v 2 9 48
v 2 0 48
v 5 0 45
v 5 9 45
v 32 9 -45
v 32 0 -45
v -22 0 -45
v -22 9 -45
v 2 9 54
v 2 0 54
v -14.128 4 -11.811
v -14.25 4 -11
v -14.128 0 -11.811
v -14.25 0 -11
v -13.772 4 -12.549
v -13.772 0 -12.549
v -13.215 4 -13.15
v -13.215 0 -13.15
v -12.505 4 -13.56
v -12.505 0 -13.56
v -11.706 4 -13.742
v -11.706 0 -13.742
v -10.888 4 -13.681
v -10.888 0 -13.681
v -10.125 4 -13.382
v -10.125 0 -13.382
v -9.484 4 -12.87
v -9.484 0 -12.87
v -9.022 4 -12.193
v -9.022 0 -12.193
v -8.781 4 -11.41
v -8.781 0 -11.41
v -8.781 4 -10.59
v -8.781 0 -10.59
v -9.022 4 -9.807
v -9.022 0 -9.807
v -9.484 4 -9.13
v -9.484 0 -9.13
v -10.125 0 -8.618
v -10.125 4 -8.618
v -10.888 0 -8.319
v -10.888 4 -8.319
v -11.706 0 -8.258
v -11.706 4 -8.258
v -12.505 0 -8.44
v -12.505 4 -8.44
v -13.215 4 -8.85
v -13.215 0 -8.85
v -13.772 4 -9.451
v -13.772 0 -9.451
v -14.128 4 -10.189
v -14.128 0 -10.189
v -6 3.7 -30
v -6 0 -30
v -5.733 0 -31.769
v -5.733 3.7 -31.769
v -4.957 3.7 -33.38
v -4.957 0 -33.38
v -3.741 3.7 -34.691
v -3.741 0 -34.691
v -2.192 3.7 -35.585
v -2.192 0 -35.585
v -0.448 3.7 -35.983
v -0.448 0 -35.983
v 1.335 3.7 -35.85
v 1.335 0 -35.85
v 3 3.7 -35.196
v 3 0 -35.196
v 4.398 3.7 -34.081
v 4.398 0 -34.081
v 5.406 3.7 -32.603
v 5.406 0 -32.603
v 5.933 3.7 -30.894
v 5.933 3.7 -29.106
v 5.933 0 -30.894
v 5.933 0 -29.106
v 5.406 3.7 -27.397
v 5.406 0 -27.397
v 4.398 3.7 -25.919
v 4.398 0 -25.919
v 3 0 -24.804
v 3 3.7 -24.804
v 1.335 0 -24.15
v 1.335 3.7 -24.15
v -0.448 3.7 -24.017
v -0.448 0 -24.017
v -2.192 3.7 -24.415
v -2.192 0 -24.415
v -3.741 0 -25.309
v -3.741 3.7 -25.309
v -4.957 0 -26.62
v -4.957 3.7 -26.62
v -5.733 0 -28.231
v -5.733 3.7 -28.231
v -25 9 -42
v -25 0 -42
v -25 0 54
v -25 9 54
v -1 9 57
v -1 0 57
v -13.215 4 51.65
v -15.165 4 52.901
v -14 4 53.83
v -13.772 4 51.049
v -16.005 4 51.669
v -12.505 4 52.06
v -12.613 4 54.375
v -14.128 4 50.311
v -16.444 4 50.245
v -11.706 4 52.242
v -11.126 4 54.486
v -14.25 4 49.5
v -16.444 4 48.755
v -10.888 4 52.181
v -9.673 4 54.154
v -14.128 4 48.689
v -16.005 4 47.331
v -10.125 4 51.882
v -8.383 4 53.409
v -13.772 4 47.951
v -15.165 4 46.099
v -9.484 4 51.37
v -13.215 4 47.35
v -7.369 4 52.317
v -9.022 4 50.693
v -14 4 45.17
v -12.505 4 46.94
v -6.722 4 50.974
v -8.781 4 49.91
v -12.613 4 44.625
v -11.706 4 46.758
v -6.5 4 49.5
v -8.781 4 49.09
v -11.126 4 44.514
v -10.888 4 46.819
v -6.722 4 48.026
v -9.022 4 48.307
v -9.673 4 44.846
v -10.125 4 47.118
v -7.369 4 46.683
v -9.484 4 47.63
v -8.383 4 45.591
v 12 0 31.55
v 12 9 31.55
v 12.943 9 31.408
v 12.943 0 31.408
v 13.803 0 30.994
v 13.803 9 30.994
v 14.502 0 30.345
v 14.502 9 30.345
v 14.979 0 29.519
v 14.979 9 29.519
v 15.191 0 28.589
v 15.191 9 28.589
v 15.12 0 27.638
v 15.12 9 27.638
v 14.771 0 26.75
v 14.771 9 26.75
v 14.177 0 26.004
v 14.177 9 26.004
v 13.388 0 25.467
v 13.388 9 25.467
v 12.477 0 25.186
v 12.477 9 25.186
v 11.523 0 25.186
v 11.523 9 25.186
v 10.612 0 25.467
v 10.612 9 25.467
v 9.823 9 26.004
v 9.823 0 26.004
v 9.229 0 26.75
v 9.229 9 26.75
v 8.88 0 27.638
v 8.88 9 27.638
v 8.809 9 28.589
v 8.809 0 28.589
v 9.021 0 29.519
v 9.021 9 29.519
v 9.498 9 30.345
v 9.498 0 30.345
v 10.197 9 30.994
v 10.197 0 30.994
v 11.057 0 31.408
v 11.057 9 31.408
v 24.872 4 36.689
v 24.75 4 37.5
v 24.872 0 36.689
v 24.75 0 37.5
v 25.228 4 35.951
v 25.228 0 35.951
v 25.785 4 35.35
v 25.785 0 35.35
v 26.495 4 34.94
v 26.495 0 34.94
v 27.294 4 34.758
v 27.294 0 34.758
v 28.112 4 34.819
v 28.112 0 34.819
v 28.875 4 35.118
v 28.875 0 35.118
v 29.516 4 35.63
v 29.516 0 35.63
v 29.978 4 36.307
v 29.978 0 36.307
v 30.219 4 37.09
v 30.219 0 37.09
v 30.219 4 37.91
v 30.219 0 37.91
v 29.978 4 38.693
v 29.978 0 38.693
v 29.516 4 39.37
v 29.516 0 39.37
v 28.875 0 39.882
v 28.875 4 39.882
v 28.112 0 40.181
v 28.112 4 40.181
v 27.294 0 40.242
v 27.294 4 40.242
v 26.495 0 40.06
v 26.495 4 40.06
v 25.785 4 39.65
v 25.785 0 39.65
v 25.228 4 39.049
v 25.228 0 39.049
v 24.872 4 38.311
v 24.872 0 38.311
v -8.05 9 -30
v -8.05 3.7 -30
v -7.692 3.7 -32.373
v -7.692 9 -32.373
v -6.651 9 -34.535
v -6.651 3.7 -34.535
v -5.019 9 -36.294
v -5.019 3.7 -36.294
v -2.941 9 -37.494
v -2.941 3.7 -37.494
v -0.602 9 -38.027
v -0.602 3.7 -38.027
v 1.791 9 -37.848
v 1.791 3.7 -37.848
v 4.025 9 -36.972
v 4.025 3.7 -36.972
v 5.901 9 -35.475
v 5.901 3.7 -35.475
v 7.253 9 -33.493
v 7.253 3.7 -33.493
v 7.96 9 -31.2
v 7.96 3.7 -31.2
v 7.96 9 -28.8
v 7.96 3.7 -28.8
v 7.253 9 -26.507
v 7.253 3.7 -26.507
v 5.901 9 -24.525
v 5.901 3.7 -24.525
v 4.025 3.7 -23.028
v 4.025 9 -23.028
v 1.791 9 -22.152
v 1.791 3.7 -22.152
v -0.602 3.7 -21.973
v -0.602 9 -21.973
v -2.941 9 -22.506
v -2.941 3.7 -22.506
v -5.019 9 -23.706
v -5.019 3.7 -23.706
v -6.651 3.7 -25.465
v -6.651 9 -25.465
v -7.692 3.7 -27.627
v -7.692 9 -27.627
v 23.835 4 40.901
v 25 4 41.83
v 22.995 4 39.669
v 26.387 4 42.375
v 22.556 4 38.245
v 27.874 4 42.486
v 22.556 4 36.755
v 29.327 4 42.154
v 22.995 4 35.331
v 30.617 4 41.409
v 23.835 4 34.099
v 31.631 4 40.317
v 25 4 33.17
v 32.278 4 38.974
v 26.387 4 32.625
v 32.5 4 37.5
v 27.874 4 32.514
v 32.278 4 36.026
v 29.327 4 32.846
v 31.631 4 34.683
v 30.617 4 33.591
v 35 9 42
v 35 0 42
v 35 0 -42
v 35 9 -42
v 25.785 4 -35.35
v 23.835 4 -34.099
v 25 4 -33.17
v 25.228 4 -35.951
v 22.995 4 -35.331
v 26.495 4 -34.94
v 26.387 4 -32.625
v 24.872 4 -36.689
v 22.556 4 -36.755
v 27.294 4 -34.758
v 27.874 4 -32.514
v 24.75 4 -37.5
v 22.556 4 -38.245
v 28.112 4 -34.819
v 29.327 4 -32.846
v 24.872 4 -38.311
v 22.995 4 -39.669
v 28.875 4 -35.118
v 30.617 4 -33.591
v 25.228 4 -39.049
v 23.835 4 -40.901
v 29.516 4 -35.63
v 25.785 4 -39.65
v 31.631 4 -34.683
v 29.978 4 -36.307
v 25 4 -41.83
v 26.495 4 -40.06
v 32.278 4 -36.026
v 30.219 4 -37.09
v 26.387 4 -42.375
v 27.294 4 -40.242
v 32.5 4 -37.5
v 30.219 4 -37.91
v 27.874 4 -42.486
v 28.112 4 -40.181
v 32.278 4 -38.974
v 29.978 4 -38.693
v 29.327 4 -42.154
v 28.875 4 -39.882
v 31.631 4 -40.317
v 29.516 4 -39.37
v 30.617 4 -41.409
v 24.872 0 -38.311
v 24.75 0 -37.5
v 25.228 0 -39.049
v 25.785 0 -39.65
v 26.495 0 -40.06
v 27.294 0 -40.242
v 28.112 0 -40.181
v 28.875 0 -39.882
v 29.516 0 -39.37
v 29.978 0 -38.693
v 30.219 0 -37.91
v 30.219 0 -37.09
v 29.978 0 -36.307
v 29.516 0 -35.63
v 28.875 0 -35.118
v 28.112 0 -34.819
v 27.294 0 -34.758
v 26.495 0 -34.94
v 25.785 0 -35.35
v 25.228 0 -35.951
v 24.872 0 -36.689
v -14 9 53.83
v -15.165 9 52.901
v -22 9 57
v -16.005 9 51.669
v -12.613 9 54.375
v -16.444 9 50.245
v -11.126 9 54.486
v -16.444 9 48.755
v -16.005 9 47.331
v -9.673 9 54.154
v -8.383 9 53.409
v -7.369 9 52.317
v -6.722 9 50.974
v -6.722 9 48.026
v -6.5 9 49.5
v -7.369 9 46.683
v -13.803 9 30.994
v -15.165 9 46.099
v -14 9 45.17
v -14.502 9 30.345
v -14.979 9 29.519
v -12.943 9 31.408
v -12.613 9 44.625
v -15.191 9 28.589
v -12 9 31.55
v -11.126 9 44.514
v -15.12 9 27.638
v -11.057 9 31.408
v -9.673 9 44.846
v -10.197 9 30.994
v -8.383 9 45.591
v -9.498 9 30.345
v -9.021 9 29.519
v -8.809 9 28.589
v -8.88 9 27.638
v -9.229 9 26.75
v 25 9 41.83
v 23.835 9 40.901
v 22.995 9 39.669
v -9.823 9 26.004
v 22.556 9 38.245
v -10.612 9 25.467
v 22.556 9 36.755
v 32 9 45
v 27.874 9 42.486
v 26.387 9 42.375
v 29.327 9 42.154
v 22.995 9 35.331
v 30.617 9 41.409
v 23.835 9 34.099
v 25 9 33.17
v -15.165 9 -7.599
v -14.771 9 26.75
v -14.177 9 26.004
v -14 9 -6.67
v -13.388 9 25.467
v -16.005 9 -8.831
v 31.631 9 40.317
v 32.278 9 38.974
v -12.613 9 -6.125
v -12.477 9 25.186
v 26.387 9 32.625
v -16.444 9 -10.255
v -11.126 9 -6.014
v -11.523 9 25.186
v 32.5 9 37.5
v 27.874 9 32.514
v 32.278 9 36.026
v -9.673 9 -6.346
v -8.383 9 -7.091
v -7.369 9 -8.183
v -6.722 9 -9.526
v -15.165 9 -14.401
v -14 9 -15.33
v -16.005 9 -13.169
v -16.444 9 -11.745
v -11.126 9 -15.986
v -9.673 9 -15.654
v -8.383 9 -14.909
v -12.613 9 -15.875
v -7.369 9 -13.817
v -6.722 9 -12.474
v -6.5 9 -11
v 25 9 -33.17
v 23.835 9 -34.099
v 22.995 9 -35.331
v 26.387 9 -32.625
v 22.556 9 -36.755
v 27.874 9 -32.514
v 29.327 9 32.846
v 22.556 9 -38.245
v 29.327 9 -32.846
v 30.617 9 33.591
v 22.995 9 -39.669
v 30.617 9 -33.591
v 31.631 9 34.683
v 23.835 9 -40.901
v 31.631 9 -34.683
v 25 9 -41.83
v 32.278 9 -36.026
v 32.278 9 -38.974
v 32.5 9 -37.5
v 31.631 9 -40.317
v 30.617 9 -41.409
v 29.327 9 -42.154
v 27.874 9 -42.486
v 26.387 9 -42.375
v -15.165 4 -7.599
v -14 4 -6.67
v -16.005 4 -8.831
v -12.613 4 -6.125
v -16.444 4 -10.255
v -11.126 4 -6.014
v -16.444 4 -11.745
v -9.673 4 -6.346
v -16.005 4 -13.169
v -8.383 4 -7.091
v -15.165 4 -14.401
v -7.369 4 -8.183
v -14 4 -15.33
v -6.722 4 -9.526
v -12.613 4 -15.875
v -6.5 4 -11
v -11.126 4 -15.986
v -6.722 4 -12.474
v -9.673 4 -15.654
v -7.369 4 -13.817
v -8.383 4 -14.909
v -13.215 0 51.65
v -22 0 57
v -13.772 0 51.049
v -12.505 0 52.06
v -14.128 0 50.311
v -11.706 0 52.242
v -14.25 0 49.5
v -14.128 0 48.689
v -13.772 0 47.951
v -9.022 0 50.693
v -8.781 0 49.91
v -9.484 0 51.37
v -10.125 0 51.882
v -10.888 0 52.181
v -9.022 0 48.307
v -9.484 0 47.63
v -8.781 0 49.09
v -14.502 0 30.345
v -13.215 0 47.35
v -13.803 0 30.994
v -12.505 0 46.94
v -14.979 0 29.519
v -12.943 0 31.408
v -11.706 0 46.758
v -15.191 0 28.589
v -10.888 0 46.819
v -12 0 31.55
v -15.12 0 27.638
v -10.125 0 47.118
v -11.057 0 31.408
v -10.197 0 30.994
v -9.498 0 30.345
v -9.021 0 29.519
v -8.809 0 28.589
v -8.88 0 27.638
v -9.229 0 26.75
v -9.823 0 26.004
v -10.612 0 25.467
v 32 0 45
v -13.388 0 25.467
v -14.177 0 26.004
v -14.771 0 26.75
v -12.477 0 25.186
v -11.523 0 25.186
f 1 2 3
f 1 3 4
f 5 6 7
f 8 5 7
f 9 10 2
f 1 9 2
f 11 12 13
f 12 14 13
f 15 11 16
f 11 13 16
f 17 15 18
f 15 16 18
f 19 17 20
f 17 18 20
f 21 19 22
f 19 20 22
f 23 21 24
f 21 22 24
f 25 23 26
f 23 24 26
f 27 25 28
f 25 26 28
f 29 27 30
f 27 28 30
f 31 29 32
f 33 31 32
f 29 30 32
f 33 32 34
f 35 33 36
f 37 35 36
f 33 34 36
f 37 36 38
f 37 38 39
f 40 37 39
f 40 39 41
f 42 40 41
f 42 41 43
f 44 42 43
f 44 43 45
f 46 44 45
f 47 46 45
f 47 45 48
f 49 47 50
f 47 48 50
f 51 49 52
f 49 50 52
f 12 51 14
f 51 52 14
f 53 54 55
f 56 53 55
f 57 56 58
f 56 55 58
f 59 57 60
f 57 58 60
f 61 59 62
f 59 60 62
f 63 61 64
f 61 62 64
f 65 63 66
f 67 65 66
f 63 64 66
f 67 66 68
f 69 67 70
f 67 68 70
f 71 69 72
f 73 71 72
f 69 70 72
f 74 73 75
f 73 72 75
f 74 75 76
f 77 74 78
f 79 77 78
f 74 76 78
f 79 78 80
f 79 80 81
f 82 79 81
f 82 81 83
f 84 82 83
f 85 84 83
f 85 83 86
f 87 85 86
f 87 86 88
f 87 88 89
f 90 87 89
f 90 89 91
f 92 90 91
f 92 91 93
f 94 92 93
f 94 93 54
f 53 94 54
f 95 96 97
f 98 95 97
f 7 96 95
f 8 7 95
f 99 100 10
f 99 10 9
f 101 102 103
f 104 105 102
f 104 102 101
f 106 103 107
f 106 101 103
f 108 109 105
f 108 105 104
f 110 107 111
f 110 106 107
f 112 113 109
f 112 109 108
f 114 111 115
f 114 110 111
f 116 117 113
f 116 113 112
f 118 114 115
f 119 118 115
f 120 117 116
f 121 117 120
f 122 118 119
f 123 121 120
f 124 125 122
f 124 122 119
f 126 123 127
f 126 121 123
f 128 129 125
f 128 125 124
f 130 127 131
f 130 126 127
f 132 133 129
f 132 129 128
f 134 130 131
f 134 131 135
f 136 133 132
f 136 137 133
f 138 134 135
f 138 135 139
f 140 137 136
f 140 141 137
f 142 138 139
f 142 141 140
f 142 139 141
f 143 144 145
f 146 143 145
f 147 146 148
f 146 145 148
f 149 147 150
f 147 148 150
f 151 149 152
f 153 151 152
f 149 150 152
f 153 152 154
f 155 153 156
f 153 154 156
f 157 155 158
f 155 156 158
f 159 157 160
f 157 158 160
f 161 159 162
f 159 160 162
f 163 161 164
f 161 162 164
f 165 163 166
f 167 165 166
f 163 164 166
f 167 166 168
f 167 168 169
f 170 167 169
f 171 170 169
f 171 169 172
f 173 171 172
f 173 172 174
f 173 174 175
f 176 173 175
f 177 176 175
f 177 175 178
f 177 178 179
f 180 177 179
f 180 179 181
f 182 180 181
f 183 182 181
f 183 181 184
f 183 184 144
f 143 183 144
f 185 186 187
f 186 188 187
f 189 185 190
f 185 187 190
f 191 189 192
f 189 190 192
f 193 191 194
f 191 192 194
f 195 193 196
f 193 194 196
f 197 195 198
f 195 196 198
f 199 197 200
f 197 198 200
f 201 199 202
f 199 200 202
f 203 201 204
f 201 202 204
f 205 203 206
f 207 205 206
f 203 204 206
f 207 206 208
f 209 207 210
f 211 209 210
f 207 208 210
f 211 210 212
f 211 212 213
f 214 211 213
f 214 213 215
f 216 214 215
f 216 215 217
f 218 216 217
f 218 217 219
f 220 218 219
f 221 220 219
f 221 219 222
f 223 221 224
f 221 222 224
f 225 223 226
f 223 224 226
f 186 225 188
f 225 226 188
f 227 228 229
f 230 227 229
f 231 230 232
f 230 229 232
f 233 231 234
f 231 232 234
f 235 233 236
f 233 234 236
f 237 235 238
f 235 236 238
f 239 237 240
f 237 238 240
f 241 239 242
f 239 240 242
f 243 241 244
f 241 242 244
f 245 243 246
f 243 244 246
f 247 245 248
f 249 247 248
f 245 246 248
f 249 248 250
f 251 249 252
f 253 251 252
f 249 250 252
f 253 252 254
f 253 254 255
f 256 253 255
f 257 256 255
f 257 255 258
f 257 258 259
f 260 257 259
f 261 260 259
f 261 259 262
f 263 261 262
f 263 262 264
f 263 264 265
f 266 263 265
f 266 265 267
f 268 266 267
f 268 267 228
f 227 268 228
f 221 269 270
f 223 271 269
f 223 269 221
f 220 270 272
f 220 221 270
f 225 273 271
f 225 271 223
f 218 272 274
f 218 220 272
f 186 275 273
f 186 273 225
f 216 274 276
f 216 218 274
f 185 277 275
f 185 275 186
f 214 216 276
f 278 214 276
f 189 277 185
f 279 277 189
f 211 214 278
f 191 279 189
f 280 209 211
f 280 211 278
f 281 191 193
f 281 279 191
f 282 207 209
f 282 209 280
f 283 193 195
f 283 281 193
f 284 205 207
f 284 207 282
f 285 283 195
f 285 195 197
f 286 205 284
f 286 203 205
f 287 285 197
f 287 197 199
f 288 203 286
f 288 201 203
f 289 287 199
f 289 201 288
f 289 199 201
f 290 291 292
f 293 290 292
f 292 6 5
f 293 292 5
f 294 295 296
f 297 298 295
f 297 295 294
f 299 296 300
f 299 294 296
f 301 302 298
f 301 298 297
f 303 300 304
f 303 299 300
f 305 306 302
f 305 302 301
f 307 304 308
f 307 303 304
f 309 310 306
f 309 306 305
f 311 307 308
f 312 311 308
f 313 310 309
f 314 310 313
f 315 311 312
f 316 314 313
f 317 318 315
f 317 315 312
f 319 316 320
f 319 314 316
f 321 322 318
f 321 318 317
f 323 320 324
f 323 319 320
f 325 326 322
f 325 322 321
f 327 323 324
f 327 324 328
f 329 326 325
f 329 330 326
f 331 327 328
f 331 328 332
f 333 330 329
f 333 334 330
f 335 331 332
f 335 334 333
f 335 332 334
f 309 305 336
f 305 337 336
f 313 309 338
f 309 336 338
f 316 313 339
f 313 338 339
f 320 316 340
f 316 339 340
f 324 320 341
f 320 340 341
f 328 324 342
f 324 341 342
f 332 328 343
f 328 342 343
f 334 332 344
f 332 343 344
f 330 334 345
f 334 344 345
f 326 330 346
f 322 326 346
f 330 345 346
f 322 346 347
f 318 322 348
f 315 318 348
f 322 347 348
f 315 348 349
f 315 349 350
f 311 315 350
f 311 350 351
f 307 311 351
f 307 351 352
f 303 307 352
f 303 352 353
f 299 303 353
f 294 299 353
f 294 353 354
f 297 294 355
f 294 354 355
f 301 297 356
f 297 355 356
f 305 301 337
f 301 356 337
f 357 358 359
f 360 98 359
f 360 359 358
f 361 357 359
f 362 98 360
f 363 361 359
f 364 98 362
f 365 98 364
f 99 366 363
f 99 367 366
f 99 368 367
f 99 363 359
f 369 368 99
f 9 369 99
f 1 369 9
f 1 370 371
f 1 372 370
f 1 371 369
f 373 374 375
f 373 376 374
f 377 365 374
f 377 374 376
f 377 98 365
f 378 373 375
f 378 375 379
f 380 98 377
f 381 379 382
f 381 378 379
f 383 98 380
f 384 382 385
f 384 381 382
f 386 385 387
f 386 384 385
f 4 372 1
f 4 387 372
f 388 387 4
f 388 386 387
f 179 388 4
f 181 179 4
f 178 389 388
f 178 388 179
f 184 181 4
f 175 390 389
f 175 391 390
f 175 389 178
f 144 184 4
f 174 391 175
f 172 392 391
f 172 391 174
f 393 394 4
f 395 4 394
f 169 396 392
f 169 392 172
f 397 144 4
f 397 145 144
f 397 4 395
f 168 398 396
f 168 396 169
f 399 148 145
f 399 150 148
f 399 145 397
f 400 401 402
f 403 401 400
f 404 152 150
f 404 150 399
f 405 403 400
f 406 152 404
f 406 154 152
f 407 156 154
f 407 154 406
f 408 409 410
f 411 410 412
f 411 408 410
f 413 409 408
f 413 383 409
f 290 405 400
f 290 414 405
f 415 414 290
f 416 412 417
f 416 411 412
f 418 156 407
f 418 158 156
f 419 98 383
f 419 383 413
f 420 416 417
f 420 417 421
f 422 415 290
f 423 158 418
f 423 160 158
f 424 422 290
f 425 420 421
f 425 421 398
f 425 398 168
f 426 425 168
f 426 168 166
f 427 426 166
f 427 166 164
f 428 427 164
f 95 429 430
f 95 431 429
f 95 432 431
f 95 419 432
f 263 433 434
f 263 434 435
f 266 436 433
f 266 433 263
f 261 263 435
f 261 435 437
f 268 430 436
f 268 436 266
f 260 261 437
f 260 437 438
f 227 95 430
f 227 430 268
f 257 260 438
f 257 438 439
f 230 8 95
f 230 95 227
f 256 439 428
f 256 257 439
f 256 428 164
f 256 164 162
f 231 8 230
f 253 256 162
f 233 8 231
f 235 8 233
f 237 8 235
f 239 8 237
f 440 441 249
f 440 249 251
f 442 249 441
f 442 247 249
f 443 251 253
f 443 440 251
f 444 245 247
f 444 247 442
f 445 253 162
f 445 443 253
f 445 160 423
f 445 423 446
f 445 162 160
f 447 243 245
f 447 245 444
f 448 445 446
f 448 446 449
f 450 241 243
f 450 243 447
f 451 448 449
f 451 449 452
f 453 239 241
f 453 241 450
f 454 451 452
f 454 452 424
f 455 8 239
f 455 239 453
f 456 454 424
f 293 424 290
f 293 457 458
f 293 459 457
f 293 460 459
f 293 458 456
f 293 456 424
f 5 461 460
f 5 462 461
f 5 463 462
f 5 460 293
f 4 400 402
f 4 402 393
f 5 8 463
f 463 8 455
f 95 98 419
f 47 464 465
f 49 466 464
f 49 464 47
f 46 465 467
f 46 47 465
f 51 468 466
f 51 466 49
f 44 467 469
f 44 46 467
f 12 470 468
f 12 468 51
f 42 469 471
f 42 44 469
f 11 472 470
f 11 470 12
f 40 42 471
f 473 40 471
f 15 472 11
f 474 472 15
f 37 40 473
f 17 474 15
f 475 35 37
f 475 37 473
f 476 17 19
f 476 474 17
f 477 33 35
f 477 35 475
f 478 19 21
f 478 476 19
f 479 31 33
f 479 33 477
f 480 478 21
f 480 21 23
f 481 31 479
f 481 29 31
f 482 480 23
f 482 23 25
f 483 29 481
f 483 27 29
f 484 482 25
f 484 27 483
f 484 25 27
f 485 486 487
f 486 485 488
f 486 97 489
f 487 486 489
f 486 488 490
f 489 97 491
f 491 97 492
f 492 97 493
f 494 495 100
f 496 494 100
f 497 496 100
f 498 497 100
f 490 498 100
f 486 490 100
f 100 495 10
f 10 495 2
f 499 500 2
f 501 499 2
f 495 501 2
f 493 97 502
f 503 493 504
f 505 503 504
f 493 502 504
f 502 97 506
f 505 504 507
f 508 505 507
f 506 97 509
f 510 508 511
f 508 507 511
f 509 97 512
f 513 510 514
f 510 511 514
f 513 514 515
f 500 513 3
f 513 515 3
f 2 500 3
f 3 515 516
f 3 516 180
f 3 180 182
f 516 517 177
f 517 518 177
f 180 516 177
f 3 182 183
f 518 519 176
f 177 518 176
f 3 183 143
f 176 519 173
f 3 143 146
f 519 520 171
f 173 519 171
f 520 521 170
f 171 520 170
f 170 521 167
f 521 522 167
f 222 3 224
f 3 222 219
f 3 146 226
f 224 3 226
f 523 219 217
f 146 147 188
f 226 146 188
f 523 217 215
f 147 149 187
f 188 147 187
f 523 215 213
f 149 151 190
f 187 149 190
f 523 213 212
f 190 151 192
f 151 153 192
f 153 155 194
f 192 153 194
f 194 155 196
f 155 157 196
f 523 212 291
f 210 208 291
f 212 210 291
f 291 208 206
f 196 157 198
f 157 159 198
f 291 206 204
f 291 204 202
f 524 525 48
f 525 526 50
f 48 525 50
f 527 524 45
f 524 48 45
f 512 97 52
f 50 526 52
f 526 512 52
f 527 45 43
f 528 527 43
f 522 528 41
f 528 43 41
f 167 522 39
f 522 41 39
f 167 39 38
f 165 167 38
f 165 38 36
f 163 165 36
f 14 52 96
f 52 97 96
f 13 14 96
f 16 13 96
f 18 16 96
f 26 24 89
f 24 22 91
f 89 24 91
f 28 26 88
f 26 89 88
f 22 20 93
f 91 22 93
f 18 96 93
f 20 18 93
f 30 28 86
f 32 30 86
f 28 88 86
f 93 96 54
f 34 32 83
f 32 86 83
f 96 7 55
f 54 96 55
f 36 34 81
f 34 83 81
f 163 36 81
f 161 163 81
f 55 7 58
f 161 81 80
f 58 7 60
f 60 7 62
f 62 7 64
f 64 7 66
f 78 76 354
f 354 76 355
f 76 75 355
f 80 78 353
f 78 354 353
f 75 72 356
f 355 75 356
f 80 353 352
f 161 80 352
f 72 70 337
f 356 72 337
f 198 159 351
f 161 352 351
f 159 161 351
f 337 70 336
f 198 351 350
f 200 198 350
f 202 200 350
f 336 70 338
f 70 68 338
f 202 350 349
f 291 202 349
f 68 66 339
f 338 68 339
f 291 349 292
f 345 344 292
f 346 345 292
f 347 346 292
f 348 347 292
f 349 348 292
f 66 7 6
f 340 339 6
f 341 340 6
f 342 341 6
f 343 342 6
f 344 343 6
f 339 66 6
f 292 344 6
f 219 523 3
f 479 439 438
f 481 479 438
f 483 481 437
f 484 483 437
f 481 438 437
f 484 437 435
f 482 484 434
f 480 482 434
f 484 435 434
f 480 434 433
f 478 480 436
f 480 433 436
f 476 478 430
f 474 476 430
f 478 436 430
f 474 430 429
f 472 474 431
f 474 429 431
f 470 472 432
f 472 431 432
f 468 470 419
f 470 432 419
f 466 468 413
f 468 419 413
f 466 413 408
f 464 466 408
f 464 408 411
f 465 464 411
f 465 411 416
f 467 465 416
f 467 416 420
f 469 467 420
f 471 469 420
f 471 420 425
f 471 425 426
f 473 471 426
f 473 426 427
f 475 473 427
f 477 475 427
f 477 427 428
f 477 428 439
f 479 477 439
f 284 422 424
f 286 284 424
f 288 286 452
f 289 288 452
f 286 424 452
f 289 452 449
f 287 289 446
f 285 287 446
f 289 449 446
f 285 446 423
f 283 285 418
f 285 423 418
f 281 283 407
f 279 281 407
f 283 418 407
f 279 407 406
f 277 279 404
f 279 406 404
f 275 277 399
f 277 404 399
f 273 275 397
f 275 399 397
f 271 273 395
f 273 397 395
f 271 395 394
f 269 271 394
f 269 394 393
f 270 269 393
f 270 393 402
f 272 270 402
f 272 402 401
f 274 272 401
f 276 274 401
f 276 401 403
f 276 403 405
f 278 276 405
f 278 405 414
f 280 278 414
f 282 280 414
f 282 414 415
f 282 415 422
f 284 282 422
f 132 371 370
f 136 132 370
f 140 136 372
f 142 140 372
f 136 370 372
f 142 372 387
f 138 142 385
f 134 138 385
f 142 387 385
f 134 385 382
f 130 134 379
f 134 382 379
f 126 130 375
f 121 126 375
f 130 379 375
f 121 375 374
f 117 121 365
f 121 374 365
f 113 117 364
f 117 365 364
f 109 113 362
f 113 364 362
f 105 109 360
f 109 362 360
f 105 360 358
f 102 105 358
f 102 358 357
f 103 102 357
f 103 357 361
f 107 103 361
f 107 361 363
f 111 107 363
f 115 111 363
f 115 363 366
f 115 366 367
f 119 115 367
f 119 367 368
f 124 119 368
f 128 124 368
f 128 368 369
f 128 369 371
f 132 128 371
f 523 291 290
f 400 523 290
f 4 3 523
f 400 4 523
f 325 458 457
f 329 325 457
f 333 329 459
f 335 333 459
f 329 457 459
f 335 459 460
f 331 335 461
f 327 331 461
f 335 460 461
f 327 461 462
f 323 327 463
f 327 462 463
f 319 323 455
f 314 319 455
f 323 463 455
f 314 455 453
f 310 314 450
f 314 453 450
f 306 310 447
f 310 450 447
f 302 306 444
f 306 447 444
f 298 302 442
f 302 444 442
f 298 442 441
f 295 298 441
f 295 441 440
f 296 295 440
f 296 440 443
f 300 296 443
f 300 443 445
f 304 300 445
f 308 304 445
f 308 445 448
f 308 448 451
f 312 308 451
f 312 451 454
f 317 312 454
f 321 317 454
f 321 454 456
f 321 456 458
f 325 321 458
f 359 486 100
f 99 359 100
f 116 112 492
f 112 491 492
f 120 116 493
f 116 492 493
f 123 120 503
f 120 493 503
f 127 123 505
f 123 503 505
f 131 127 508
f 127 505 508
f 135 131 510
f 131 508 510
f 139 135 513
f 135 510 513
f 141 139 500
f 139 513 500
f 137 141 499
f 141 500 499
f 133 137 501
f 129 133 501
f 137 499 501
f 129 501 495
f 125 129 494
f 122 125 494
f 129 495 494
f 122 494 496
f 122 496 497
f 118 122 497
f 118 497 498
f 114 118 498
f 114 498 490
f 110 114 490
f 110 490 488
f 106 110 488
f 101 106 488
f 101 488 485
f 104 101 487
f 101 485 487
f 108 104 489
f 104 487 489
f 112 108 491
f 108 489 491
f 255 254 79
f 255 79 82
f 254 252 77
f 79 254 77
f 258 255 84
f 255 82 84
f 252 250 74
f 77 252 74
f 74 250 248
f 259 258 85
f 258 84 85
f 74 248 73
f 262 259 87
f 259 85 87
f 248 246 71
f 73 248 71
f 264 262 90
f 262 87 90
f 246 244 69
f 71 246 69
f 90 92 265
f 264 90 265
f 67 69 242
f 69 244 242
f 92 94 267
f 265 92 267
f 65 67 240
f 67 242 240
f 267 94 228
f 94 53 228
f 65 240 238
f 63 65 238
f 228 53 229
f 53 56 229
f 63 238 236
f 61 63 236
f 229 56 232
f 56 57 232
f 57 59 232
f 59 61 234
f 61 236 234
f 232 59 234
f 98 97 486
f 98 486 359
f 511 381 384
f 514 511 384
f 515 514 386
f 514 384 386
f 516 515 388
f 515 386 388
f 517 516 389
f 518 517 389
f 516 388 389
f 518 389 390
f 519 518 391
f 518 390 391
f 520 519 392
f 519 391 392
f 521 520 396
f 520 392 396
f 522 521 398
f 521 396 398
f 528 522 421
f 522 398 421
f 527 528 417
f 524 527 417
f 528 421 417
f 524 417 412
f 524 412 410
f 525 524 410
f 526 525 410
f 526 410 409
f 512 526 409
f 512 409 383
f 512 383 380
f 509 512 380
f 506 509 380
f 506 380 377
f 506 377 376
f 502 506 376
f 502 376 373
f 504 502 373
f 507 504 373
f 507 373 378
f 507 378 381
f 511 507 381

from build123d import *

# Parameters (mm, degrees)
BOSS_EXTRUDE1_DEPTH            = 9
CBORE_FOR_M5_SHCS1_D           = 5.5
CBORE_FOR_M5_SHCS1_CBORE_D     = 10
CBORE_FOR_M5_SHCS1_CBORE_DEPTH = 5
F_1_0MM_DOWEL_HOLE1_D          = 16.1
F_1_0MM_DOWEL_HOLE1_DEPTH      = 5.3
F_1_0MM_DOWEL_HOLE3_D          = 12
SKETCH14_R                     = 3.2
CUT_EXTRUDE1_DEPTH             = 68.490740106
CHAMFER1_SIZE                  = 3


with BuildPart() as part:
    # Sketch1 → Boss-Extrude1 (new body)
    with BuildSketch(Plane(origin=(0, 0, 0), x_dir=(1, 0, 0), z_dir=(0, 1, 0))):
        Polygon((2, -45), (35, -45), (35, 45), (-25, 45), (-25, -57), (2, -57), align=None)
    extrude(amount=BOSS_EXTRUDE1_DEPTH)

    # CBORE for M5 SHCS1 (through all)
    with Locations(Plane(origin=(0, 9, 0), x_dir=(1, 0, 0), z_dir=(0, 1, 0))):
        with Locations((27.5, 37.5), (27.5, -37.5), (-11.5, 11), (-11.5, -49.5)):
            CounterBoreHole(CBORE_FOR_M5_SHCS1_D / 2, CBORE_FOR_M5_SHCS1_CBORE_D / 2, CBORE_FOR_M5_SHCS1_CBORE_DEPTH)

    # Ø1.0mm Dowel Hole1
    with Locations(Plane(origin=(0, 9, 0), x_dir=(1, 0, 0), z_dir=(0, 1, 0))):
        with Locations((0, 30)):
            Hole(F_1_0MM_DOWEL_HOLE1_D / 2, depth=F_1_0MM_DOWEL_HOLE1_DEPTH)

    # Ø1.0mm Dowel Hole3 (through all)
    with Locations(Plane(origin=(0, 3.7, 0), x_dir=(1, 0, 0), z_dir=(0, 1, 0))):
        with Locations((0, 30)):
            Hole(F_1_0MM_DOWEL_HOLE3_D / 2)

    # Sketch14 → Cut-Extrude1 (cut, through all)
    with BuildSketch(Plane(origin=(0, 9, 0), x_dir=(1, 0, 0), z_dir=(0, 1, 0))):
        with Locations(Location((12, -28.35, 0), (0, 0, 270))):
            Circle(SKETCH14_R)
        with Locations(Location((-12, -28.35, 0), (0, 0, 270))):
            Circle(SKETCH14_R)
    extrude(amount=-CUT_EXTRUDE1_DEPTH, mode=Mode.SUBTRACT)

    # Chamfer1
    chamfer1_edges = [part.edges().sort_by_distance(p)[0] for p in [
        (35, 4.5, 45),
        (2, 4.5, 45),
        (2, 4.5, 57),
        (-25, 4.5, 57),
        (-25, 4.5, -45),
        (35, 4.5, -45),
    ]]
    chamfer(chamfer1_edges, length=CHAMFER1_SIZE)


solid = part.part
